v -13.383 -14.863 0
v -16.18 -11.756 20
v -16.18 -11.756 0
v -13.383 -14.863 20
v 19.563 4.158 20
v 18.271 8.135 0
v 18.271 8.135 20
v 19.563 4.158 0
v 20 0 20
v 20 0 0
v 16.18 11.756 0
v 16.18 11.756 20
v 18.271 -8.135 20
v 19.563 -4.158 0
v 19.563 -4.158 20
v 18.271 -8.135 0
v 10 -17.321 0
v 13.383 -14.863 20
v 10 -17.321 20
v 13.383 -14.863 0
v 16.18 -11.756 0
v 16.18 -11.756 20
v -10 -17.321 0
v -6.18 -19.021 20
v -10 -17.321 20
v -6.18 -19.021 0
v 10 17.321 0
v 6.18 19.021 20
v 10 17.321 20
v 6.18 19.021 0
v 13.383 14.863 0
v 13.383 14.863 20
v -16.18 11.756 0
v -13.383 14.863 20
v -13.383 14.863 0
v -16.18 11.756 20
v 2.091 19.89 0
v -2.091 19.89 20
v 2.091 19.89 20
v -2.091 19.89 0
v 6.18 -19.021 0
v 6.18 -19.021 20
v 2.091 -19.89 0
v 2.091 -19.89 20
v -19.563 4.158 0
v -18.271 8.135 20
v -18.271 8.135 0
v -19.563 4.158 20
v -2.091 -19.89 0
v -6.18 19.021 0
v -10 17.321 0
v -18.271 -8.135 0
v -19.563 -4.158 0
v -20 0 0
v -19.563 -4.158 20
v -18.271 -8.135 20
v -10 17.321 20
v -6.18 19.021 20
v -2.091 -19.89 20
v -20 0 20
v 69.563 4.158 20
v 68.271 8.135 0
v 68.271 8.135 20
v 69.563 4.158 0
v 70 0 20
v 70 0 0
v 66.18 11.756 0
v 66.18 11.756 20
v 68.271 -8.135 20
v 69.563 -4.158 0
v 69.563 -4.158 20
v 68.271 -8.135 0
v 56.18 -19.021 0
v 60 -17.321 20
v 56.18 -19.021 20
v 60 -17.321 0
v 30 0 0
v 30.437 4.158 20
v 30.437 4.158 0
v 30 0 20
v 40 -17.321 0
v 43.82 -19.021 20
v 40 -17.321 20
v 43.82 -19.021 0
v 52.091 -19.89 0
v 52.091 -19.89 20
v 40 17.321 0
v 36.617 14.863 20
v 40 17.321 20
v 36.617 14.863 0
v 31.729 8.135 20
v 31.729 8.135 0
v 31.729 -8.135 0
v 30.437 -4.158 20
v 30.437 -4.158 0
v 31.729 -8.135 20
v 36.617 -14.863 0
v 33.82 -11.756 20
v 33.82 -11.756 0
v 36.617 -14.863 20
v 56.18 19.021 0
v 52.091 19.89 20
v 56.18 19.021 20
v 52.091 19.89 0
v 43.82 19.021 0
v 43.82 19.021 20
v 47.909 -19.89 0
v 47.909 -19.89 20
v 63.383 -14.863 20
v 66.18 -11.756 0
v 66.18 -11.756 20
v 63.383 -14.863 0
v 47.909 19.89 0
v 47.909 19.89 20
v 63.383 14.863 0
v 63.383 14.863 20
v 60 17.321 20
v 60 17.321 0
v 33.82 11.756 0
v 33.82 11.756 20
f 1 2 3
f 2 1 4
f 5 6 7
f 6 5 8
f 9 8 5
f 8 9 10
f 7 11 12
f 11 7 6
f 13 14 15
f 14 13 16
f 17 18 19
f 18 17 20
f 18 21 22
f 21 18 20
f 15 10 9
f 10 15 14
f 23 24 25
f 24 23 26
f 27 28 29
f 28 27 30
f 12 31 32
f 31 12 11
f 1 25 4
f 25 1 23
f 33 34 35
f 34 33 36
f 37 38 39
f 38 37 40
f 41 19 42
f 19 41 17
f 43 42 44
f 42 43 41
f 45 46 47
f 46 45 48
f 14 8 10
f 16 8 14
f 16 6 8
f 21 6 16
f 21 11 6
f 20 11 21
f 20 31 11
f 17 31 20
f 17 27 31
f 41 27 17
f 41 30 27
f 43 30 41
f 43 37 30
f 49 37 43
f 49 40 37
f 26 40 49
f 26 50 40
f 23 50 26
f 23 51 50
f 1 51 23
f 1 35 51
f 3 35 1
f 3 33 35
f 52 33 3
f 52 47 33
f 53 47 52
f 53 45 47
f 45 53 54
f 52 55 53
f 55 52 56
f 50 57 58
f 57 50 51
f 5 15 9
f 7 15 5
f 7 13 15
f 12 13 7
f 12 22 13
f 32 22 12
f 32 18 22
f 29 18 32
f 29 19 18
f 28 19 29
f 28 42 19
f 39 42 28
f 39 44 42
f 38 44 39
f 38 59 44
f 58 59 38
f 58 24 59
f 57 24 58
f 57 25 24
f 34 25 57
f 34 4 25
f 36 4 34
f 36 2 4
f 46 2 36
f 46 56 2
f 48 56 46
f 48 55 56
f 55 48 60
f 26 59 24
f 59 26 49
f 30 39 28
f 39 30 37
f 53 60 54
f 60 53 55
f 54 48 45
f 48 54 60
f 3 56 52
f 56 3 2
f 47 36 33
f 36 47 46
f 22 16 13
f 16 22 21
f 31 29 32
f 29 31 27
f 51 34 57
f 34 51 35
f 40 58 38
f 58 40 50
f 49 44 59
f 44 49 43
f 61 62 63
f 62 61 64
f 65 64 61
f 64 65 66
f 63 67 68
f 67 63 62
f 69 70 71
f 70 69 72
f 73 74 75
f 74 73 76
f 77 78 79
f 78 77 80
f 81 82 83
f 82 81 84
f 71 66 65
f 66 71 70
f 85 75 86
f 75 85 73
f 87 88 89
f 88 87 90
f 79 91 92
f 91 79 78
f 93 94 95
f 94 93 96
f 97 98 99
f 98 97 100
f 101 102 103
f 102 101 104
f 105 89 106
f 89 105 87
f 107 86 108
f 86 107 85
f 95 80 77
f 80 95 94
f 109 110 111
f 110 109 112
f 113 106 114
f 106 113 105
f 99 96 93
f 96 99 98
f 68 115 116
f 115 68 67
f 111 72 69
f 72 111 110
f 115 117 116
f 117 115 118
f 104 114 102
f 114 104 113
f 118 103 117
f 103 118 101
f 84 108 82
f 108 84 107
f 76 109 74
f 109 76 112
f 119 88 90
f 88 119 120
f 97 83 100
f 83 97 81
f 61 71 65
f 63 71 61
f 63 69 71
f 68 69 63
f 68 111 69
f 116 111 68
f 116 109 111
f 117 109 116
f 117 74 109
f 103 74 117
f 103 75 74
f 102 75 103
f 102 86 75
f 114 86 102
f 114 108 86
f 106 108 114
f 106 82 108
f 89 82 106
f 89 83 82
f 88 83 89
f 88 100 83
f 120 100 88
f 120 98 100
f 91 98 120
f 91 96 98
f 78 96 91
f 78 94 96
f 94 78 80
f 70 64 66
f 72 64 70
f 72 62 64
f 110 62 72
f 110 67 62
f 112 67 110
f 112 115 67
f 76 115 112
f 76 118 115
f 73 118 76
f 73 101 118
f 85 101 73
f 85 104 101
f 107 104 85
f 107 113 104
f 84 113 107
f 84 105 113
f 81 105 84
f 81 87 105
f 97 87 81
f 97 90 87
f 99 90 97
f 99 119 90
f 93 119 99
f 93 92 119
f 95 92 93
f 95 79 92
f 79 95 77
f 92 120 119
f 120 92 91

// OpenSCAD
x=10;

cylinder(h=20,r=x);

x=20;

translate([50,0,0]) cylinder(h=20,r=x);
